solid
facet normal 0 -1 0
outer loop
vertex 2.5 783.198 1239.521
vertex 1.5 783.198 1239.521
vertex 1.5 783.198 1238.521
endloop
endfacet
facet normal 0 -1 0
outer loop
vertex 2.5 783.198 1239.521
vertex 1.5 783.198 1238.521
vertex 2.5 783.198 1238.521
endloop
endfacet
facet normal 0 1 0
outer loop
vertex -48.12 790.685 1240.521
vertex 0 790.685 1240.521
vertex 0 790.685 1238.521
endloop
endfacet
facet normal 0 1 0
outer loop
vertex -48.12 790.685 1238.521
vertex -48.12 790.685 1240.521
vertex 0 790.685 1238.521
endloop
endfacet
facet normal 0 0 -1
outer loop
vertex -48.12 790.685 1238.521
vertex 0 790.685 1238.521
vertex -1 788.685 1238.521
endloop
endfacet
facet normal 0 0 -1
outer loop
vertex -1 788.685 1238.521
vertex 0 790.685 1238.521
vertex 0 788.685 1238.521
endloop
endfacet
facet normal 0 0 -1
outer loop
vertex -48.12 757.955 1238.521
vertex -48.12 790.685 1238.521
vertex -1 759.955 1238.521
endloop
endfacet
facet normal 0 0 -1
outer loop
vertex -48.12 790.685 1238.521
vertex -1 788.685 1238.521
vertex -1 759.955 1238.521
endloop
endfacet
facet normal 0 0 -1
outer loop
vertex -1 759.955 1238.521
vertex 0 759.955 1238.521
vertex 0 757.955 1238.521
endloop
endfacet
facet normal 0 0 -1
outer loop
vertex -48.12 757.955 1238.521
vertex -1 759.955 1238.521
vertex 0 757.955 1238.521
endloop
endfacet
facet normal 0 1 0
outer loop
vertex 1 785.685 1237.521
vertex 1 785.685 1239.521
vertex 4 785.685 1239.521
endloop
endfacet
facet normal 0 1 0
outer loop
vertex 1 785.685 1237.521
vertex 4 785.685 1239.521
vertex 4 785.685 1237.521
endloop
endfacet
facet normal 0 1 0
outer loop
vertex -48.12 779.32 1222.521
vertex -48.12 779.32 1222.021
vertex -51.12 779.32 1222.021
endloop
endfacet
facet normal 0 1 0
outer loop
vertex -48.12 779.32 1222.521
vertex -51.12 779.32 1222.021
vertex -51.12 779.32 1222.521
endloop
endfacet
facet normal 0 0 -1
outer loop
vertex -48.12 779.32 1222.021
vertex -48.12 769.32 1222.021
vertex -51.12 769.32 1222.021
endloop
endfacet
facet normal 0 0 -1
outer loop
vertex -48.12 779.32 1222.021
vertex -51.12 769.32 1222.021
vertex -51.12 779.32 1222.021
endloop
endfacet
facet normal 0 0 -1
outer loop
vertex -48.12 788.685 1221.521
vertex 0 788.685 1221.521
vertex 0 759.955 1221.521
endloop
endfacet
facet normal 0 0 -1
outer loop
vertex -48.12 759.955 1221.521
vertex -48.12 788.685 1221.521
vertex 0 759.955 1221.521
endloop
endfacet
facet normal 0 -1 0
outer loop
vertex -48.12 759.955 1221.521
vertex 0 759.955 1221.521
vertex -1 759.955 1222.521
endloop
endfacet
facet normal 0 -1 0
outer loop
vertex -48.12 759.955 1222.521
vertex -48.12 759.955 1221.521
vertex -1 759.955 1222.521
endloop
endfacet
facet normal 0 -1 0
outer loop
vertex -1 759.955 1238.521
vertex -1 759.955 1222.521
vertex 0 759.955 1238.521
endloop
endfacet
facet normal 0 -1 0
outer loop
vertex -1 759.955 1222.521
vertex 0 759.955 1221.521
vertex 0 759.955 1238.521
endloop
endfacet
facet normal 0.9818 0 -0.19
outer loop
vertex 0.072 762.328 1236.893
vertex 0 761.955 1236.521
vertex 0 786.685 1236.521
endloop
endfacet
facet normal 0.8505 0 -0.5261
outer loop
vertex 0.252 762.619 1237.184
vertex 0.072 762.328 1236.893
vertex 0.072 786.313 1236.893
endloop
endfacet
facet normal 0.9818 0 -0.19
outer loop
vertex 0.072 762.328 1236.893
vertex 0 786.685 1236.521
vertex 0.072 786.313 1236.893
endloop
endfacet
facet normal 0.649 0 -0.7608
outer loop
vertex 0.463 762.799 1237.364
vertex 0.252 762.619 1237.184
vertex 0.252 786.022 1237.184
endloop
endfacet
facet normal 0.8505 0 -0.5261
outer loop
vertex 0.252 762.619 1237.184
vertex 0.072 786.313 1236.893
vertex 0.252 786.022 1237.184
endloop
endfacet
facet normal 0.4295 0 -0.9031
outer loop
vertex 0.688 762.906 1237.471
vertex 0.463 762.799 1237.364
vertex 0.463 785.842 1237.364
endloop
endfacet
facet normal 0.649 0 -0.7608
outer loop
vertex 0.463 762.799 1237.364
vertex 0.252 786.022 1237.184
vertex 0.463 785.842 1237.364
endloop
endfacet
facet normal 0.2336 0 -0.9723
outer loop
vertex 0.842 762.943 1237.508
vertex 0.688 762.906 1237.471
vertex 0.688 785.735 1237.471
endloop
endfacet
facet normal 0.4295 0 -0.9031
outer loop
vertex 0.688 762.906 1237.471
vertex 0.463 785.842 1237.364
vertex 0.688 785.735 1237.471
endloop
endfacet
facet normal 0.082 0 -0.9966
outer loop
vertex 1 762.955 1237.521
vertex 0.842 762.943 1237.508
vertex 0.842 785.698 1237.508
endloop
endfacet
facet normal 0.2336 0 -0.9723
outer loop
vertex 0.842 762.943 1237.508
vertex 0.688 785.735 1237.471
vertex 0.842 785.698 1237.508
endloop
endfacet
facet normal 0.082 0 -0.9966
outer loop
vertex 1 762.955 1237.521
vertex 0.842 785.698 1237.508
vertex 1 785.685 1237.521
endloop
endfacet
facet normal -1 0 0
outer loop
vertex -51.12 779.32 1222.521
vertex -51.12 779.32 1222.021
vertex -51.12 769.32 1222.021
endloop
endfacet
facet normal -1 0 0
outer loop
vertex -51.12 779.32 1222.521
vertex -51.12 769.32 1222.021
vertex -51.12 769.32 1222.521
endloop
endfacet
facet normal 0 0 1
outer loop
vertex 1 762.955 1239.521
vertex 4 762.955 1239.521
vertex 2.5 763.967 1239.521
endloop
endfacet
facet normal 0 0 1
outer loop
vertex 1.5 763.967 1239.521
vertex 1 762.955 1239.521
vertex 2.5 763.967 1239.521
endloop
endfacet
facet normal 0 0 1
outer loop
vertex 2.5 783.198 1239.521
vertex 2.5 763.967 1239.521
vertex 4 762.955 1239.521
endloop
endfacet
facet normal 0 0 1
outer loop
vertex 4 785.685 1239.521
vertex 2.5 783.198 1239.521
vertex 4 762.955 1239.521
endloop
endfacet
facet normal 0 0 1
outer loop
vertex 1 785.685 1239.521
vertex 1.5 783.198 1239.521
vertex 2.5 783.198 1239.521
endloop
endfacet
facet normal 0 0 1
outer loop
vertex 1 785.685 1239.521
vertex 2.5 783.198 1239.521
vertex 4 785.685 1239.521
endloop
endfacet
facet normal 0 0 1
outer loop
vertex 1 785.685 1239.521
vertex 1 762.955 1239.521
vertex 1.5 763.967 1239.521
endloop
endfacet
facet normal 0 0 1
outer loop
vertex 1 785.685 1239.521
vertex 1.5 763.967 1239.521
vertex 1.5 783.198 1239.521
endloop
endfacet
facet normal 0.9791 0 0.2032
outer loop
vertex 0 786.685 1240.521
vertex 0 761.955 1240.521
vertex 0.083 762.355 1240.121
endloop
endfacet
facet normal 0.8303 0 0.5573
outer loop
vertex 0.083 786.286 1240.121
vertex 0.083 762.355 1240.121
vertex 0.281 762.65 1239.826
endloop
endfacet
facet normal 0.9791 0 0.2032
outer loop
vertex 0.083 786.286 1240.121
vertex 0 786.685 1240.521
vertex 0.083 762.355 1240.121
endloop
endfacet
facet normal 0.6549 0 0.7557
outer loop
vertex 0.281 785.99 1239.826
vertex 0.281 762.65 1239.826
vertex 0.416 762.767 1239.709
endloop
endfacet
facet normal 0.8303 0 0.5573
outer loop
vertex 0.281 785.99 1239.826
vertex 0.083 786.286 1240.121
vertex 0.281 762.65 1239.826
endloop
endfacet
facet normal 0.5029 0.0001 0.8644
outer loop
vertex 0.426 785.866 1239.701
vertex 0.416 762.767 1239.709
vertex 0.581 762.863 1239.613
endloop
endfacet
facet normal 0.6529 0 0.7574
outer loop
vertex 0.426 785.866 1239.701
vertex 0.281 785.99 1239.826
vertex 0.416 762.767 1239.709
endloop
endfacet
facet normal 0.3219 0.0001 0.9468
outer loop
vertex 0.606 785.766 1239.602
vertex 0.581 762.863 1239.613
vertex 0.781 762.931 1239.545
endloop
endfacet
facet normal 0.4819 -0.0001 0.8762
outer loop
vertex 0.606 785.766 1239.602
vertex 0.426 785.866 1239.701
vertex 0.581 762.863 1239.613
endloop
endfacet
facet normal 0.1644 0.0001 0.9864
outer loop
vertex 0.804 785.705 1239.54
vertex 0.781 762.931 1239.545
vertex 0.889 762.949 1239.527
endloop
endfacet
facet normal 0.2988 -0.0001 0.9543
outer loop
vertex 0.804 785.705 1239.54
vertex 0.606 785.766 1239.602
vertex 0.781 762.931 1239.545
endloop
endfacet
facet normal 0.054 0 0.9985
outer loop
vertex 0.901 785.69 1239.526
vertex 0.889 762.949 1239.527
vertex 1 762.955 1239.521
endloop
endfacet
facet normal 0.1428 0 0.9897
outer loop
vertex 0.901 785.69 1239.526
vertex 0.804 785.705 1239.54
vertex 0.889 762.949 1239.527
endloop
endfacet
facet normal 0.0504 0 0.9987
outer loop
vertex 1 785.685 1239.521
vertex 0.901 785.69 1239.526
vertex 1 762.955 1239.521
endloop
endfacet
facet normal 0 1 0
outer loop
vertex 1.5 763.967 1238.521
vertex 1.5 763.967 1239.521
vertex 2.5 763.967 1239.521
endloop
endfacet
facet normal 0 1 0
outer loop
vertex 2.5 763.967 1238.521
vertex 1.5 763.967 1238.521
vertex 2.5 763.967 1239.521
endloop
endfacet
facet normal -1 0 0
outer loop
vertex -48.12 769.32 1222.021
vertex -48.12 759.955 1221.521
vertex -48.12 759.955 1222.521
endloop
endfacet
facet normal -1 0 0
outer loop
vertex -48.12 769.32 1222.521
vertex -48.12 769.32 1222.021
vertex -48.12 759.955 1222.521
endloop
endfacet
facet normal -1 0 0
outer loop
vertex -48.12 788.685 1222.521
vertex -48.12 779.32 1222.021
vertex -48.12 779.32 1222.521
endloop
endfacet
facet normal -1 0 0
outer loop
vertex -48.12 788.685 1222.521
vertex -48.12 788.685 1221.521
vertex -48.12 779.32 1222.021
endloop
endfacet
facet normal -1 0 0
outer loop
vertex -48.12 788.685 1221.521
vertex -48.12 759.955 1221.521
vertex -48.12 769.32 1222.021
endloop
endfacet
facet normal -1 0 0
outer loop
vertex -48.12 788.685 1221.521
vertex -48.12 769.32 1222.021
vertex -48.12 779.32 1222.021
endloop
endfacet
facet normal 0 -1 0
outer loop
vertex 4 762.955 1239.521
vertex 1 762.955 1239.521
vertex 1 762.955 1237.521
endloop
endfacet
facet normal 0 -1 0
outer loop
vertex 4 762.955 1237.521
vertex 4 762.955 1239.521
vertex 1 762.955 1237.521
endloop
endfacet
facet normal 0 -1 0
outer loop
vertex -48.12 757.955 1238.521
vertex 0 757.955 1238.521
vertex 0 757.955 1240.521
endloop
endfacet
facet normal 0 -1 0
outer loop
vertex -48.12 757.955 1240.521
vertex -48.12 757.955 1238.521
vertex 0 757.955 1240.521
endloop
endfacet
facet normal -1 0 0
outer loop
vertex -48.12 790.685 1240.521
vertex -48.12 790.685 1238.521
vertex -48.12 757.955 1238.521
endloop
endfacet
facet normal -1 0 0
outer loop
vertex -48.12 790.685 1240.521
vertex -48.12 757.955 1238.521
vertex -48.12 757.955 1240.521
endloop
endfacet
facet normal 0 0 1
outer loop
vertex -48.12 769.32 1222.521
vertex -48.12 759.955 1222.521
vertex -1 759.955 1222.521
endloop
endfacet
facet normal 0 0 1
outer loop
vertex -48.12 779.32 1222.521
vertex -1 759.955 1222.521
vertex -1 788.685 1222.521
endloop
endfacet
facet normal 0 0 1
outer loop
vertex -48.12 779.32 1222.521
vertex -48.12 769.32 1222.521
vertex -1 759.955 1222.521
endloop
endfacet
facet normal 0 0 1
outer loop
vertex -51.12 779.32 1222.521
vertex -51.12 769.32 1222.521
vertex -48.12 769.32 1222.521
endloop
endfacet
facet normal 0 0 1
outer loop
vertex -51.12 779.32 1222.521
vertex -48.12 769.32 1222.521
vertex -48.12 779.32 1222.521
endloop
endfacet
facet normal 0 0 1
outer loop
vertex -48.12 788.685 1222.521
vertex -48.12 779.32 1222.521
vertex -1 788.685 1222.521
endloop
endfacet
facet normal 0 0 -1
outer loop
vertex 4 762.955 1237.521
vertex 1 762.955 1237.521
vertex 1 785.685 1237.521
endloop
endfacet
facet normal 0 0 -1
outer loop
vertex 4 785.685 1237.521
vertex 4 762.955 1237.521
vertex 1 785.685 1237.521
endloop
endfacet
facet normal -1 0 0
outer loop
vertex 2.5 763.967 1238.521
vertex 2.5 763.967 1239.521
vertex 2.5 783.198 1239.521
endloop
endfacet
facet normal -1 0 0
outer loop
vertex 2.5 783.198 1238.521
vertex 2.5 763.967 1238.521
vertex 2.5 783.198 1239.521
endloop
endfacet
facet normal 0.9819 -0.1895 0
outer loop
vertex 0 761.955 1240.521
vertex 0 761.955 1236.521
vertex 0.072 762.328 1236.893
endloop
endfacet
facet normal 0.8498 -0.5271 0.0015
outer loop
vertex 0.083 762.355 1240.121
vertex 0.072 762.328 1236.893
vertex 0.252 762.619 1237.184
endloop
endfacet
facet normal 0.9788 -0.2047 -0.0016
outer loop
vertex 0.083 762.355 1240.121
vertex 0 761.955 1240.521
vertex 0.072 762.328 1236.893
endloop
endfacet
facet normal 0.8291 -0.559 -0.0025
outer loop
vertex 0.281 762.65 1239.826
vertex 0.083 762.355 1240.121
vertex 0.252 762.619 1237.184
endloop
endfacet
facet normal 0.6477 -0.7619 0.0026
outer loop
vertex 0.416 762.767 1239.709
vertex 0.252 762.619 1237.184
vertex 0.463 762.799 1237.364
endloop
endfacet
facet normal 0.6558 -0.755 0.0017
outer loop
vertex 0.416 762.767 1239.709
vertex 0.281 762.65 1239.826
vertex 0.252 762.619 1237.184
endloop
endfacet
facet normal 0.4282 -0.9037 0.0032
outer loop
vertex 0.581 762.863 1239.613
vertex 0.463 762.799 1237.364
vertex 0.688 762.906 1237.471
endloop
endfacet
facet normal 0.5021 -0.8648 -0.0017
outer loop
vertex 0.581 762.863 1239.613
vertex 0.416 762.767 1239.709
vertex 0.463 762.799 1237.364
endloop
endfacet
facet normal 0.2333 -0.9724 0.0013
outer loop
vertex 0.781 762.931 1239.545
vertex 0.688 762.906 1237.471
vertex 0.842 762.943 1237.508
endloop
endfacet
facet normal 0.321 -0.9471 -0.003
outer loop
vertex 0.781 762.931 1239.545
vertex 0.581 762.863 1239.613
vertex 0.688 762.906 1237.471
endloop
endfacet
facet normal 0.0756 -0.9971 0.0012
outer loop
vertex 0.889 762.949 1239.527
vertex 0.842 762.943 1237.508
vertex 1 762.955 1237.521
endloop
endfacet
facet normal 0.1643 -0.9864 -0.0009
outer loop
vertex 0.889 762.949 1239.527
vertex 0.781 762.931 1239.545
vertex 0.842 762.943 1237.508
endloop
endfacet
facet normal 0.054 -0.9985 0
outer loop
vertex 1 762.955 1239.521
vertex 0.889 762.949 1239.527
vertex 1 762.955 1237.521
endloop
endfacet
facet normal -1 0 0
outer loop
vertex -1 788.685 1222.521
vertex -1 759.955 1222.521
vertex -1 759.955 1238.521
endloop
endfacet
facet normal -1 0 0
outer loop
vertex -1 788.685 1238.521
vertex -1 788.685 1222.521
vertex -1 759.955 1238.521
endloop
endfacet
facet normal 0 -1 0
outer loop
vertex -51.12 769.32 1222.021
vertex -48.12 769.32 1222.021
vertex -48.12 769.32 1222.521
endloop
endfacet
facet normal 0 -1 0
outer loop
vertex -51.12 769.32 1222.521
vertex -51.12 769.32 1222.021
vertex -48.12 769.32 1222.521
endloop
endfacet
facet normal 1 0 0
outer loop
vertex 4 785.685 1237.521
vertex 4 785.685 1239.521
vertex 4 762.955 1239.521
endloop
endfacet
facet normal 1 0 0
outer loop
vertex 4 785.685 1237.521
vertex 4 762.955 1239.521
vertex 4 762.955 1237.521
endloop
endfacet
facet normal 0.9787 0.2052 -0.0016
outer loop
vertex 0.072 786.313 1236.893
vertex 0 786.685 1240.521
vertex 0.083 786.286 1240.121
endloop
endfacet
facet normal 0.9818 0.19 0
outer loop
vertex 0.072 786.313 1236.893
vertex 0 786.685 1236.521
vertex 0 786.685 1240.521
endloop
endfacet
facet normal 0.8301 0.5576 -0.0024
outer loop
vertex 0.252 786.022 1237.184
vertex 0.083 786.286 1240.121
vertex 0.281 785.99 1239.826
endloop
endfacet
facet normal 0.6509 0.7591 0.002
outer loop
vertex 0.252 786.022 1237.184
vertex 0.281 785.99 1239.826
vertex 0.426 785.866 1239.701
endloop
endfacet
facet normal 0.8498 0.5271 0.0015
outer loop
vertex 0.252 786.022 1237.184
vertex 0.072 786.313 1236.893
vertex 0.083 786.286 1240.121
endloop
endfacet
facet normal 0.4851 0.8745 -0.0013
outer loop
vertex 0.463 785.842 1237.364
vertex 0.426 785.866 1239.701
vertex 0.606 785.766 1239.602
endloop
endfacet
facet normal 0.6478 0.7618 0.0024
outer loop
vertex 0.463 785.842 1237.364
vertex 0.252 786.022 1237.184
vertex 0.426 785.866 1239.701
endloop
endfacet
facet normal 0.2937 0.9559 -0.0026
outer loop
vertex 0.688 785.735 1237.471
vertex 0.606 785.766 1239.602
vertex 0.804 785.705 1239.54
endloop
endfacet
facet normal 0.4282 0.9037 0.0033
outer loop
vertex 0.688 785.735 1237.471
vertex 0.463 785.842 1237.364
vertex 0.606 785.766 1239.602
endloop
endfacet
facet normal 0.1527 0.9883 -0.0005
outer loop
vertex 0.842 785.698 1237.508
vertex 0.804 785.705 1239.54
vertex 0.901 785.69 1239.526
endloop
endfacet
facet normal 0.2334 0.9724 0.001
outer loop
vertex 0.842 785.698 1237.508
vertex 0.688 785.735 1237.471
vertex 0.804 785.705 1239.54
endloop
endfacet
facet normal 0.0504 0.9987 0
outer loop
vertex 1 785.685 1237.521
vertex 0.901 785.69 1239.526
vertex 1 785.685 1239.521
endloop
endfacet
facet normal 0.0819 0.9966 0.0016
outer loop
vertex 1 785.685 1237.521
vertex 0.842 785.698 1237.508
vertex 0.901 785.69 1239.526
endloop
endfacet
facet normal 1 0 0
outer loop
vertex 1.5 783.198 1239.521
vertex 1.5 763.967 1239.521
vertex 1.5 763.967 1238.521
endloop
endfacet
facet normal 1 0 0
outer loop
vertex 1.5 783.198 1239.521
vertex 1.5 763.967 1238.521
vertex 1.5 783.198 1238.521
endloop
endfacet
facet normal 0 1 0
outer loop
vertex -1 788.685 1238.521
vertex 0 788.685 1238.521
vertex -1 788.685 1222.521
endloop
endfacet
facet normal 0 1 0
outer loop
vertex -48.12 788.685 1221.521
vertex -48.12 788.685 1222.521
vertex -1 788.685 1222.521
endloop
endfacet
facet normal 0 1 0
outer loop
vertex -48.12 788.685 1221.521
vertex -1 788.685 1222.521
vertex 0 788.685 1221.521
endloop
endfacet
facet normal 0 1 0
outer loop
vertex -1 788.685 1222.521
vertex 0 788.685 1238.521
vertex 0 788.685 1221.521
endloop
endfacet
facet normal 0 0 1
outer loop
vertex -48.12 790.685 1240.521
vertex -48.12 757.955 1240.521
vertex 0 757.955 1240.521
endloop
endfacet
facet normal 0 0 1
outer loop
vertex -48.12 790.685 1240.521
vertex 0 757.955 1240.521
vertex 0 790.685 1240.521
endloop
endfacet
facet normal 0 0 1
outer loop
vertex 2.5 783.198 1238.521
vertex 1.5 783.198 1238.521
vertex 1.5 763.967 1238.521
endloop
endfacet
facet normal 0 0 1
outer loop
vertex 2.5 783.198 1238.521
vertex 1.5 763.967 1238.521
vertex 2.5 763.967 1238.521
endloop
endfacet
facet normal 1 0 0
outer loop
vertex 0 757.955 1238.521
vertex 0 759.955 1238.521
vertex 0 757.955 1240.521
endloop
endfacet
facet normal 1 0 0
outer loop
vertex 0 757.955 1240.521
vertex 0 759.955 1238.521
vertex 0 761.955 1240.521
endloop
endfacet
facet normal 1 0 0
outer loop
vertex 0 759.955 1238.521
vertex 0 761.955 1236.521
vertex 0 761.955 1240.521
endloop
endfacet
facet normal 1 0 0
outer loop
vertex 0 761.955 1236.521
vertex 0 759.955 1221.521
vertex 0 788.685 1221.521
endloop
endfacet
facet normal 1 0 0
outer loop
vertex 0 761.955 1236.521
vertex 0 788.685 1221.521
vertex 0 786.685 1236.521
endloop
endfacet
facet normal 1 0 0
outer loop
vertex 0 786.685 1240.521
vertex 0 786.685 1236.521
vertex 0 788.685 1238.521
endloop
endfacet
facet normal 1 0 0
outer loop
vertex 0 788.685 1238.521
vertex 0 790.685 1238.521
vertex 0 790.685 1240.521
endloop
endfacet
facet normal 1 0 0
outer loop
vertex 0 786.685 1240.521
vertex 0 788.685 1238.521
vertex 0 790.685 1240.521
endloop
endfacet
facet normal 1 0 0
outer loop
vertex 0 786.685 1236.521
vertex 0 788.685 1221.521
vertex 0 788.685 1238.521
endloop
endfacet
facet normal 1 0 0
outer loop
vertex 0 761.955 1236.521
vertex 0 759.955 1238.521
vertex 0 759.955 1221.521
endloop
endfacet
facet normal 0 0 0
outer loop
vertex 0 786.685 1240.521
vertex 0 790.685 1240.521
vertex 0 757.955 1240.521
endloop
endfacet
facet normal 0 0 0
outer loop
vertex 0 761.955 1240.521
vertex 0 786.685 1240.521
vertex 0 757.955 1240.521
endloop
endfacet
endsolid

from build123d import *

# Parameters (mm, degrees)
BOSS_EXTRUDE1_DEPTH = 48.12
SKETCH3_W           = 16
SKETCH3_H           = 28.73
CUT_EXTRUDE1_DEPTH  = 47.12
SKETCH4_W           = 0.5
SKETCH4_H           = 10
BOSS_EXTRUDE2_DEPTH = 3
SKETCH5_W           = 2
SKETCH5_H           = 22.73
BOSS_EXTRUDE3_DEPTH = 4
SKETCH6_W           = 1
SKETCH6_H           = 19.230578804
CUT_EXTRUDE2_DEPTH  = 1
FILLET1_R           = 1
FILLET2_R           = 1
FILLET3_R           = 1
FILLET4_R           = 1


with BuildPart() as part:
    # Sketch2 → Boss-Extrude1 (new body)
    with BuildSketch(Plane(origin=(0, 0, 0), x_dir=(0, 0, -1), z_dir=(1, 0, 0))):
        Polygon((-1238.520696333, 790.685360665), (-1238.520696333, 788.685360665), (-1221.520696333, 788.685360665), (-1221.520696333, 759.955360665), (-1238.520696333, 759.955360665), (-1238.520696333, 757.955360665), (-1240.520696333, 757.955360665), (-1240.520696333, 790.685360665), align=None)
    extrude(amount=-BOSS_EXTRUDE1_DEPTH)

    # Sketch3 → Cut-Extrude1 (cut)
    with BuildSketch(Plane.ZY.offset(48.12)):
        with Locations((1230.520696333, 774.320360665)):
            Rectangle(SKETCH3_W, SKETCH3_H)
    extrude(amount=-CUT_EXTRUDE1_DEPTH, mode=Mode.SUBTRACT)

    # Sketch4 → Boss-Extrude2 (add)
    with BuildSketch(Plane.ZY.offset(48.12)):
        with Locations((1222.270696333, 774.320360665)):
            Rectangle(SKETCH4_W, SKETCH4_H)
    extrude(amount=BOSS_EXTRUDE2_DEPTH)

    # Sketch5 → Boss-Extrude3 (add)
    with BuildSketch(Plane(origin=(0, 0, 0), x_dir=(0, 0, -1), z_dir=(1, 0, 0))):
        with Locations((-1238.520696333, 774.320360665)):
            Rectangle(SKETCH5_W, SKETCH5_H)
    extrude(amount=BOSS_EXTRUDE3_DEPTH)

    # Sketch6 → Cut-Extrude2 (cut)
    with BuildSketch(Plane.XY.offset(1239.520696333)):
        with Locations((2, 773.582614675)):
            Rectangle(SKETCH6_W, SKETCH6_H)
    extrude(amount=-CUT_EXTRUDE2_DEPTH, mode=Mode.SUBTRACT)

    # Fillet1
    fillet1_edges = [part.edges().sort_by_distance(p)[0] for p in [
        (0, 774.320360665, 1239.520696333),
    ]]
    fillet(fillet1_edges, radius=FILLET1_R - 0.0001)  # a hair under: the kernel refuses the full size

    # Fillet2
    fillet2_edges = [part.edges().sort_by_distance(p)[0] for p in [
        (0, 774.320360665, 1237.520696333),
    ]]
    fillet(fillet2_edges, radius=FILLET2_R)

    # Fillet3
    fillet3_edges = [part.edges().sort_by_distance(p)[0] for p in [
        (0, 785.685360665, 1238.520646333),
    ]]
    fillet(fillet3_edges, radius=FILLET3_R)

    # Fillet4
    fillet4_edges = [part.edges().sort_by_distance(p)[0] for p in [
        (0, 762.955360665, 1238.520646333),
    ]]
    fillet(fillet4_edges, radius=FILLET4_R)


solid = part.part
